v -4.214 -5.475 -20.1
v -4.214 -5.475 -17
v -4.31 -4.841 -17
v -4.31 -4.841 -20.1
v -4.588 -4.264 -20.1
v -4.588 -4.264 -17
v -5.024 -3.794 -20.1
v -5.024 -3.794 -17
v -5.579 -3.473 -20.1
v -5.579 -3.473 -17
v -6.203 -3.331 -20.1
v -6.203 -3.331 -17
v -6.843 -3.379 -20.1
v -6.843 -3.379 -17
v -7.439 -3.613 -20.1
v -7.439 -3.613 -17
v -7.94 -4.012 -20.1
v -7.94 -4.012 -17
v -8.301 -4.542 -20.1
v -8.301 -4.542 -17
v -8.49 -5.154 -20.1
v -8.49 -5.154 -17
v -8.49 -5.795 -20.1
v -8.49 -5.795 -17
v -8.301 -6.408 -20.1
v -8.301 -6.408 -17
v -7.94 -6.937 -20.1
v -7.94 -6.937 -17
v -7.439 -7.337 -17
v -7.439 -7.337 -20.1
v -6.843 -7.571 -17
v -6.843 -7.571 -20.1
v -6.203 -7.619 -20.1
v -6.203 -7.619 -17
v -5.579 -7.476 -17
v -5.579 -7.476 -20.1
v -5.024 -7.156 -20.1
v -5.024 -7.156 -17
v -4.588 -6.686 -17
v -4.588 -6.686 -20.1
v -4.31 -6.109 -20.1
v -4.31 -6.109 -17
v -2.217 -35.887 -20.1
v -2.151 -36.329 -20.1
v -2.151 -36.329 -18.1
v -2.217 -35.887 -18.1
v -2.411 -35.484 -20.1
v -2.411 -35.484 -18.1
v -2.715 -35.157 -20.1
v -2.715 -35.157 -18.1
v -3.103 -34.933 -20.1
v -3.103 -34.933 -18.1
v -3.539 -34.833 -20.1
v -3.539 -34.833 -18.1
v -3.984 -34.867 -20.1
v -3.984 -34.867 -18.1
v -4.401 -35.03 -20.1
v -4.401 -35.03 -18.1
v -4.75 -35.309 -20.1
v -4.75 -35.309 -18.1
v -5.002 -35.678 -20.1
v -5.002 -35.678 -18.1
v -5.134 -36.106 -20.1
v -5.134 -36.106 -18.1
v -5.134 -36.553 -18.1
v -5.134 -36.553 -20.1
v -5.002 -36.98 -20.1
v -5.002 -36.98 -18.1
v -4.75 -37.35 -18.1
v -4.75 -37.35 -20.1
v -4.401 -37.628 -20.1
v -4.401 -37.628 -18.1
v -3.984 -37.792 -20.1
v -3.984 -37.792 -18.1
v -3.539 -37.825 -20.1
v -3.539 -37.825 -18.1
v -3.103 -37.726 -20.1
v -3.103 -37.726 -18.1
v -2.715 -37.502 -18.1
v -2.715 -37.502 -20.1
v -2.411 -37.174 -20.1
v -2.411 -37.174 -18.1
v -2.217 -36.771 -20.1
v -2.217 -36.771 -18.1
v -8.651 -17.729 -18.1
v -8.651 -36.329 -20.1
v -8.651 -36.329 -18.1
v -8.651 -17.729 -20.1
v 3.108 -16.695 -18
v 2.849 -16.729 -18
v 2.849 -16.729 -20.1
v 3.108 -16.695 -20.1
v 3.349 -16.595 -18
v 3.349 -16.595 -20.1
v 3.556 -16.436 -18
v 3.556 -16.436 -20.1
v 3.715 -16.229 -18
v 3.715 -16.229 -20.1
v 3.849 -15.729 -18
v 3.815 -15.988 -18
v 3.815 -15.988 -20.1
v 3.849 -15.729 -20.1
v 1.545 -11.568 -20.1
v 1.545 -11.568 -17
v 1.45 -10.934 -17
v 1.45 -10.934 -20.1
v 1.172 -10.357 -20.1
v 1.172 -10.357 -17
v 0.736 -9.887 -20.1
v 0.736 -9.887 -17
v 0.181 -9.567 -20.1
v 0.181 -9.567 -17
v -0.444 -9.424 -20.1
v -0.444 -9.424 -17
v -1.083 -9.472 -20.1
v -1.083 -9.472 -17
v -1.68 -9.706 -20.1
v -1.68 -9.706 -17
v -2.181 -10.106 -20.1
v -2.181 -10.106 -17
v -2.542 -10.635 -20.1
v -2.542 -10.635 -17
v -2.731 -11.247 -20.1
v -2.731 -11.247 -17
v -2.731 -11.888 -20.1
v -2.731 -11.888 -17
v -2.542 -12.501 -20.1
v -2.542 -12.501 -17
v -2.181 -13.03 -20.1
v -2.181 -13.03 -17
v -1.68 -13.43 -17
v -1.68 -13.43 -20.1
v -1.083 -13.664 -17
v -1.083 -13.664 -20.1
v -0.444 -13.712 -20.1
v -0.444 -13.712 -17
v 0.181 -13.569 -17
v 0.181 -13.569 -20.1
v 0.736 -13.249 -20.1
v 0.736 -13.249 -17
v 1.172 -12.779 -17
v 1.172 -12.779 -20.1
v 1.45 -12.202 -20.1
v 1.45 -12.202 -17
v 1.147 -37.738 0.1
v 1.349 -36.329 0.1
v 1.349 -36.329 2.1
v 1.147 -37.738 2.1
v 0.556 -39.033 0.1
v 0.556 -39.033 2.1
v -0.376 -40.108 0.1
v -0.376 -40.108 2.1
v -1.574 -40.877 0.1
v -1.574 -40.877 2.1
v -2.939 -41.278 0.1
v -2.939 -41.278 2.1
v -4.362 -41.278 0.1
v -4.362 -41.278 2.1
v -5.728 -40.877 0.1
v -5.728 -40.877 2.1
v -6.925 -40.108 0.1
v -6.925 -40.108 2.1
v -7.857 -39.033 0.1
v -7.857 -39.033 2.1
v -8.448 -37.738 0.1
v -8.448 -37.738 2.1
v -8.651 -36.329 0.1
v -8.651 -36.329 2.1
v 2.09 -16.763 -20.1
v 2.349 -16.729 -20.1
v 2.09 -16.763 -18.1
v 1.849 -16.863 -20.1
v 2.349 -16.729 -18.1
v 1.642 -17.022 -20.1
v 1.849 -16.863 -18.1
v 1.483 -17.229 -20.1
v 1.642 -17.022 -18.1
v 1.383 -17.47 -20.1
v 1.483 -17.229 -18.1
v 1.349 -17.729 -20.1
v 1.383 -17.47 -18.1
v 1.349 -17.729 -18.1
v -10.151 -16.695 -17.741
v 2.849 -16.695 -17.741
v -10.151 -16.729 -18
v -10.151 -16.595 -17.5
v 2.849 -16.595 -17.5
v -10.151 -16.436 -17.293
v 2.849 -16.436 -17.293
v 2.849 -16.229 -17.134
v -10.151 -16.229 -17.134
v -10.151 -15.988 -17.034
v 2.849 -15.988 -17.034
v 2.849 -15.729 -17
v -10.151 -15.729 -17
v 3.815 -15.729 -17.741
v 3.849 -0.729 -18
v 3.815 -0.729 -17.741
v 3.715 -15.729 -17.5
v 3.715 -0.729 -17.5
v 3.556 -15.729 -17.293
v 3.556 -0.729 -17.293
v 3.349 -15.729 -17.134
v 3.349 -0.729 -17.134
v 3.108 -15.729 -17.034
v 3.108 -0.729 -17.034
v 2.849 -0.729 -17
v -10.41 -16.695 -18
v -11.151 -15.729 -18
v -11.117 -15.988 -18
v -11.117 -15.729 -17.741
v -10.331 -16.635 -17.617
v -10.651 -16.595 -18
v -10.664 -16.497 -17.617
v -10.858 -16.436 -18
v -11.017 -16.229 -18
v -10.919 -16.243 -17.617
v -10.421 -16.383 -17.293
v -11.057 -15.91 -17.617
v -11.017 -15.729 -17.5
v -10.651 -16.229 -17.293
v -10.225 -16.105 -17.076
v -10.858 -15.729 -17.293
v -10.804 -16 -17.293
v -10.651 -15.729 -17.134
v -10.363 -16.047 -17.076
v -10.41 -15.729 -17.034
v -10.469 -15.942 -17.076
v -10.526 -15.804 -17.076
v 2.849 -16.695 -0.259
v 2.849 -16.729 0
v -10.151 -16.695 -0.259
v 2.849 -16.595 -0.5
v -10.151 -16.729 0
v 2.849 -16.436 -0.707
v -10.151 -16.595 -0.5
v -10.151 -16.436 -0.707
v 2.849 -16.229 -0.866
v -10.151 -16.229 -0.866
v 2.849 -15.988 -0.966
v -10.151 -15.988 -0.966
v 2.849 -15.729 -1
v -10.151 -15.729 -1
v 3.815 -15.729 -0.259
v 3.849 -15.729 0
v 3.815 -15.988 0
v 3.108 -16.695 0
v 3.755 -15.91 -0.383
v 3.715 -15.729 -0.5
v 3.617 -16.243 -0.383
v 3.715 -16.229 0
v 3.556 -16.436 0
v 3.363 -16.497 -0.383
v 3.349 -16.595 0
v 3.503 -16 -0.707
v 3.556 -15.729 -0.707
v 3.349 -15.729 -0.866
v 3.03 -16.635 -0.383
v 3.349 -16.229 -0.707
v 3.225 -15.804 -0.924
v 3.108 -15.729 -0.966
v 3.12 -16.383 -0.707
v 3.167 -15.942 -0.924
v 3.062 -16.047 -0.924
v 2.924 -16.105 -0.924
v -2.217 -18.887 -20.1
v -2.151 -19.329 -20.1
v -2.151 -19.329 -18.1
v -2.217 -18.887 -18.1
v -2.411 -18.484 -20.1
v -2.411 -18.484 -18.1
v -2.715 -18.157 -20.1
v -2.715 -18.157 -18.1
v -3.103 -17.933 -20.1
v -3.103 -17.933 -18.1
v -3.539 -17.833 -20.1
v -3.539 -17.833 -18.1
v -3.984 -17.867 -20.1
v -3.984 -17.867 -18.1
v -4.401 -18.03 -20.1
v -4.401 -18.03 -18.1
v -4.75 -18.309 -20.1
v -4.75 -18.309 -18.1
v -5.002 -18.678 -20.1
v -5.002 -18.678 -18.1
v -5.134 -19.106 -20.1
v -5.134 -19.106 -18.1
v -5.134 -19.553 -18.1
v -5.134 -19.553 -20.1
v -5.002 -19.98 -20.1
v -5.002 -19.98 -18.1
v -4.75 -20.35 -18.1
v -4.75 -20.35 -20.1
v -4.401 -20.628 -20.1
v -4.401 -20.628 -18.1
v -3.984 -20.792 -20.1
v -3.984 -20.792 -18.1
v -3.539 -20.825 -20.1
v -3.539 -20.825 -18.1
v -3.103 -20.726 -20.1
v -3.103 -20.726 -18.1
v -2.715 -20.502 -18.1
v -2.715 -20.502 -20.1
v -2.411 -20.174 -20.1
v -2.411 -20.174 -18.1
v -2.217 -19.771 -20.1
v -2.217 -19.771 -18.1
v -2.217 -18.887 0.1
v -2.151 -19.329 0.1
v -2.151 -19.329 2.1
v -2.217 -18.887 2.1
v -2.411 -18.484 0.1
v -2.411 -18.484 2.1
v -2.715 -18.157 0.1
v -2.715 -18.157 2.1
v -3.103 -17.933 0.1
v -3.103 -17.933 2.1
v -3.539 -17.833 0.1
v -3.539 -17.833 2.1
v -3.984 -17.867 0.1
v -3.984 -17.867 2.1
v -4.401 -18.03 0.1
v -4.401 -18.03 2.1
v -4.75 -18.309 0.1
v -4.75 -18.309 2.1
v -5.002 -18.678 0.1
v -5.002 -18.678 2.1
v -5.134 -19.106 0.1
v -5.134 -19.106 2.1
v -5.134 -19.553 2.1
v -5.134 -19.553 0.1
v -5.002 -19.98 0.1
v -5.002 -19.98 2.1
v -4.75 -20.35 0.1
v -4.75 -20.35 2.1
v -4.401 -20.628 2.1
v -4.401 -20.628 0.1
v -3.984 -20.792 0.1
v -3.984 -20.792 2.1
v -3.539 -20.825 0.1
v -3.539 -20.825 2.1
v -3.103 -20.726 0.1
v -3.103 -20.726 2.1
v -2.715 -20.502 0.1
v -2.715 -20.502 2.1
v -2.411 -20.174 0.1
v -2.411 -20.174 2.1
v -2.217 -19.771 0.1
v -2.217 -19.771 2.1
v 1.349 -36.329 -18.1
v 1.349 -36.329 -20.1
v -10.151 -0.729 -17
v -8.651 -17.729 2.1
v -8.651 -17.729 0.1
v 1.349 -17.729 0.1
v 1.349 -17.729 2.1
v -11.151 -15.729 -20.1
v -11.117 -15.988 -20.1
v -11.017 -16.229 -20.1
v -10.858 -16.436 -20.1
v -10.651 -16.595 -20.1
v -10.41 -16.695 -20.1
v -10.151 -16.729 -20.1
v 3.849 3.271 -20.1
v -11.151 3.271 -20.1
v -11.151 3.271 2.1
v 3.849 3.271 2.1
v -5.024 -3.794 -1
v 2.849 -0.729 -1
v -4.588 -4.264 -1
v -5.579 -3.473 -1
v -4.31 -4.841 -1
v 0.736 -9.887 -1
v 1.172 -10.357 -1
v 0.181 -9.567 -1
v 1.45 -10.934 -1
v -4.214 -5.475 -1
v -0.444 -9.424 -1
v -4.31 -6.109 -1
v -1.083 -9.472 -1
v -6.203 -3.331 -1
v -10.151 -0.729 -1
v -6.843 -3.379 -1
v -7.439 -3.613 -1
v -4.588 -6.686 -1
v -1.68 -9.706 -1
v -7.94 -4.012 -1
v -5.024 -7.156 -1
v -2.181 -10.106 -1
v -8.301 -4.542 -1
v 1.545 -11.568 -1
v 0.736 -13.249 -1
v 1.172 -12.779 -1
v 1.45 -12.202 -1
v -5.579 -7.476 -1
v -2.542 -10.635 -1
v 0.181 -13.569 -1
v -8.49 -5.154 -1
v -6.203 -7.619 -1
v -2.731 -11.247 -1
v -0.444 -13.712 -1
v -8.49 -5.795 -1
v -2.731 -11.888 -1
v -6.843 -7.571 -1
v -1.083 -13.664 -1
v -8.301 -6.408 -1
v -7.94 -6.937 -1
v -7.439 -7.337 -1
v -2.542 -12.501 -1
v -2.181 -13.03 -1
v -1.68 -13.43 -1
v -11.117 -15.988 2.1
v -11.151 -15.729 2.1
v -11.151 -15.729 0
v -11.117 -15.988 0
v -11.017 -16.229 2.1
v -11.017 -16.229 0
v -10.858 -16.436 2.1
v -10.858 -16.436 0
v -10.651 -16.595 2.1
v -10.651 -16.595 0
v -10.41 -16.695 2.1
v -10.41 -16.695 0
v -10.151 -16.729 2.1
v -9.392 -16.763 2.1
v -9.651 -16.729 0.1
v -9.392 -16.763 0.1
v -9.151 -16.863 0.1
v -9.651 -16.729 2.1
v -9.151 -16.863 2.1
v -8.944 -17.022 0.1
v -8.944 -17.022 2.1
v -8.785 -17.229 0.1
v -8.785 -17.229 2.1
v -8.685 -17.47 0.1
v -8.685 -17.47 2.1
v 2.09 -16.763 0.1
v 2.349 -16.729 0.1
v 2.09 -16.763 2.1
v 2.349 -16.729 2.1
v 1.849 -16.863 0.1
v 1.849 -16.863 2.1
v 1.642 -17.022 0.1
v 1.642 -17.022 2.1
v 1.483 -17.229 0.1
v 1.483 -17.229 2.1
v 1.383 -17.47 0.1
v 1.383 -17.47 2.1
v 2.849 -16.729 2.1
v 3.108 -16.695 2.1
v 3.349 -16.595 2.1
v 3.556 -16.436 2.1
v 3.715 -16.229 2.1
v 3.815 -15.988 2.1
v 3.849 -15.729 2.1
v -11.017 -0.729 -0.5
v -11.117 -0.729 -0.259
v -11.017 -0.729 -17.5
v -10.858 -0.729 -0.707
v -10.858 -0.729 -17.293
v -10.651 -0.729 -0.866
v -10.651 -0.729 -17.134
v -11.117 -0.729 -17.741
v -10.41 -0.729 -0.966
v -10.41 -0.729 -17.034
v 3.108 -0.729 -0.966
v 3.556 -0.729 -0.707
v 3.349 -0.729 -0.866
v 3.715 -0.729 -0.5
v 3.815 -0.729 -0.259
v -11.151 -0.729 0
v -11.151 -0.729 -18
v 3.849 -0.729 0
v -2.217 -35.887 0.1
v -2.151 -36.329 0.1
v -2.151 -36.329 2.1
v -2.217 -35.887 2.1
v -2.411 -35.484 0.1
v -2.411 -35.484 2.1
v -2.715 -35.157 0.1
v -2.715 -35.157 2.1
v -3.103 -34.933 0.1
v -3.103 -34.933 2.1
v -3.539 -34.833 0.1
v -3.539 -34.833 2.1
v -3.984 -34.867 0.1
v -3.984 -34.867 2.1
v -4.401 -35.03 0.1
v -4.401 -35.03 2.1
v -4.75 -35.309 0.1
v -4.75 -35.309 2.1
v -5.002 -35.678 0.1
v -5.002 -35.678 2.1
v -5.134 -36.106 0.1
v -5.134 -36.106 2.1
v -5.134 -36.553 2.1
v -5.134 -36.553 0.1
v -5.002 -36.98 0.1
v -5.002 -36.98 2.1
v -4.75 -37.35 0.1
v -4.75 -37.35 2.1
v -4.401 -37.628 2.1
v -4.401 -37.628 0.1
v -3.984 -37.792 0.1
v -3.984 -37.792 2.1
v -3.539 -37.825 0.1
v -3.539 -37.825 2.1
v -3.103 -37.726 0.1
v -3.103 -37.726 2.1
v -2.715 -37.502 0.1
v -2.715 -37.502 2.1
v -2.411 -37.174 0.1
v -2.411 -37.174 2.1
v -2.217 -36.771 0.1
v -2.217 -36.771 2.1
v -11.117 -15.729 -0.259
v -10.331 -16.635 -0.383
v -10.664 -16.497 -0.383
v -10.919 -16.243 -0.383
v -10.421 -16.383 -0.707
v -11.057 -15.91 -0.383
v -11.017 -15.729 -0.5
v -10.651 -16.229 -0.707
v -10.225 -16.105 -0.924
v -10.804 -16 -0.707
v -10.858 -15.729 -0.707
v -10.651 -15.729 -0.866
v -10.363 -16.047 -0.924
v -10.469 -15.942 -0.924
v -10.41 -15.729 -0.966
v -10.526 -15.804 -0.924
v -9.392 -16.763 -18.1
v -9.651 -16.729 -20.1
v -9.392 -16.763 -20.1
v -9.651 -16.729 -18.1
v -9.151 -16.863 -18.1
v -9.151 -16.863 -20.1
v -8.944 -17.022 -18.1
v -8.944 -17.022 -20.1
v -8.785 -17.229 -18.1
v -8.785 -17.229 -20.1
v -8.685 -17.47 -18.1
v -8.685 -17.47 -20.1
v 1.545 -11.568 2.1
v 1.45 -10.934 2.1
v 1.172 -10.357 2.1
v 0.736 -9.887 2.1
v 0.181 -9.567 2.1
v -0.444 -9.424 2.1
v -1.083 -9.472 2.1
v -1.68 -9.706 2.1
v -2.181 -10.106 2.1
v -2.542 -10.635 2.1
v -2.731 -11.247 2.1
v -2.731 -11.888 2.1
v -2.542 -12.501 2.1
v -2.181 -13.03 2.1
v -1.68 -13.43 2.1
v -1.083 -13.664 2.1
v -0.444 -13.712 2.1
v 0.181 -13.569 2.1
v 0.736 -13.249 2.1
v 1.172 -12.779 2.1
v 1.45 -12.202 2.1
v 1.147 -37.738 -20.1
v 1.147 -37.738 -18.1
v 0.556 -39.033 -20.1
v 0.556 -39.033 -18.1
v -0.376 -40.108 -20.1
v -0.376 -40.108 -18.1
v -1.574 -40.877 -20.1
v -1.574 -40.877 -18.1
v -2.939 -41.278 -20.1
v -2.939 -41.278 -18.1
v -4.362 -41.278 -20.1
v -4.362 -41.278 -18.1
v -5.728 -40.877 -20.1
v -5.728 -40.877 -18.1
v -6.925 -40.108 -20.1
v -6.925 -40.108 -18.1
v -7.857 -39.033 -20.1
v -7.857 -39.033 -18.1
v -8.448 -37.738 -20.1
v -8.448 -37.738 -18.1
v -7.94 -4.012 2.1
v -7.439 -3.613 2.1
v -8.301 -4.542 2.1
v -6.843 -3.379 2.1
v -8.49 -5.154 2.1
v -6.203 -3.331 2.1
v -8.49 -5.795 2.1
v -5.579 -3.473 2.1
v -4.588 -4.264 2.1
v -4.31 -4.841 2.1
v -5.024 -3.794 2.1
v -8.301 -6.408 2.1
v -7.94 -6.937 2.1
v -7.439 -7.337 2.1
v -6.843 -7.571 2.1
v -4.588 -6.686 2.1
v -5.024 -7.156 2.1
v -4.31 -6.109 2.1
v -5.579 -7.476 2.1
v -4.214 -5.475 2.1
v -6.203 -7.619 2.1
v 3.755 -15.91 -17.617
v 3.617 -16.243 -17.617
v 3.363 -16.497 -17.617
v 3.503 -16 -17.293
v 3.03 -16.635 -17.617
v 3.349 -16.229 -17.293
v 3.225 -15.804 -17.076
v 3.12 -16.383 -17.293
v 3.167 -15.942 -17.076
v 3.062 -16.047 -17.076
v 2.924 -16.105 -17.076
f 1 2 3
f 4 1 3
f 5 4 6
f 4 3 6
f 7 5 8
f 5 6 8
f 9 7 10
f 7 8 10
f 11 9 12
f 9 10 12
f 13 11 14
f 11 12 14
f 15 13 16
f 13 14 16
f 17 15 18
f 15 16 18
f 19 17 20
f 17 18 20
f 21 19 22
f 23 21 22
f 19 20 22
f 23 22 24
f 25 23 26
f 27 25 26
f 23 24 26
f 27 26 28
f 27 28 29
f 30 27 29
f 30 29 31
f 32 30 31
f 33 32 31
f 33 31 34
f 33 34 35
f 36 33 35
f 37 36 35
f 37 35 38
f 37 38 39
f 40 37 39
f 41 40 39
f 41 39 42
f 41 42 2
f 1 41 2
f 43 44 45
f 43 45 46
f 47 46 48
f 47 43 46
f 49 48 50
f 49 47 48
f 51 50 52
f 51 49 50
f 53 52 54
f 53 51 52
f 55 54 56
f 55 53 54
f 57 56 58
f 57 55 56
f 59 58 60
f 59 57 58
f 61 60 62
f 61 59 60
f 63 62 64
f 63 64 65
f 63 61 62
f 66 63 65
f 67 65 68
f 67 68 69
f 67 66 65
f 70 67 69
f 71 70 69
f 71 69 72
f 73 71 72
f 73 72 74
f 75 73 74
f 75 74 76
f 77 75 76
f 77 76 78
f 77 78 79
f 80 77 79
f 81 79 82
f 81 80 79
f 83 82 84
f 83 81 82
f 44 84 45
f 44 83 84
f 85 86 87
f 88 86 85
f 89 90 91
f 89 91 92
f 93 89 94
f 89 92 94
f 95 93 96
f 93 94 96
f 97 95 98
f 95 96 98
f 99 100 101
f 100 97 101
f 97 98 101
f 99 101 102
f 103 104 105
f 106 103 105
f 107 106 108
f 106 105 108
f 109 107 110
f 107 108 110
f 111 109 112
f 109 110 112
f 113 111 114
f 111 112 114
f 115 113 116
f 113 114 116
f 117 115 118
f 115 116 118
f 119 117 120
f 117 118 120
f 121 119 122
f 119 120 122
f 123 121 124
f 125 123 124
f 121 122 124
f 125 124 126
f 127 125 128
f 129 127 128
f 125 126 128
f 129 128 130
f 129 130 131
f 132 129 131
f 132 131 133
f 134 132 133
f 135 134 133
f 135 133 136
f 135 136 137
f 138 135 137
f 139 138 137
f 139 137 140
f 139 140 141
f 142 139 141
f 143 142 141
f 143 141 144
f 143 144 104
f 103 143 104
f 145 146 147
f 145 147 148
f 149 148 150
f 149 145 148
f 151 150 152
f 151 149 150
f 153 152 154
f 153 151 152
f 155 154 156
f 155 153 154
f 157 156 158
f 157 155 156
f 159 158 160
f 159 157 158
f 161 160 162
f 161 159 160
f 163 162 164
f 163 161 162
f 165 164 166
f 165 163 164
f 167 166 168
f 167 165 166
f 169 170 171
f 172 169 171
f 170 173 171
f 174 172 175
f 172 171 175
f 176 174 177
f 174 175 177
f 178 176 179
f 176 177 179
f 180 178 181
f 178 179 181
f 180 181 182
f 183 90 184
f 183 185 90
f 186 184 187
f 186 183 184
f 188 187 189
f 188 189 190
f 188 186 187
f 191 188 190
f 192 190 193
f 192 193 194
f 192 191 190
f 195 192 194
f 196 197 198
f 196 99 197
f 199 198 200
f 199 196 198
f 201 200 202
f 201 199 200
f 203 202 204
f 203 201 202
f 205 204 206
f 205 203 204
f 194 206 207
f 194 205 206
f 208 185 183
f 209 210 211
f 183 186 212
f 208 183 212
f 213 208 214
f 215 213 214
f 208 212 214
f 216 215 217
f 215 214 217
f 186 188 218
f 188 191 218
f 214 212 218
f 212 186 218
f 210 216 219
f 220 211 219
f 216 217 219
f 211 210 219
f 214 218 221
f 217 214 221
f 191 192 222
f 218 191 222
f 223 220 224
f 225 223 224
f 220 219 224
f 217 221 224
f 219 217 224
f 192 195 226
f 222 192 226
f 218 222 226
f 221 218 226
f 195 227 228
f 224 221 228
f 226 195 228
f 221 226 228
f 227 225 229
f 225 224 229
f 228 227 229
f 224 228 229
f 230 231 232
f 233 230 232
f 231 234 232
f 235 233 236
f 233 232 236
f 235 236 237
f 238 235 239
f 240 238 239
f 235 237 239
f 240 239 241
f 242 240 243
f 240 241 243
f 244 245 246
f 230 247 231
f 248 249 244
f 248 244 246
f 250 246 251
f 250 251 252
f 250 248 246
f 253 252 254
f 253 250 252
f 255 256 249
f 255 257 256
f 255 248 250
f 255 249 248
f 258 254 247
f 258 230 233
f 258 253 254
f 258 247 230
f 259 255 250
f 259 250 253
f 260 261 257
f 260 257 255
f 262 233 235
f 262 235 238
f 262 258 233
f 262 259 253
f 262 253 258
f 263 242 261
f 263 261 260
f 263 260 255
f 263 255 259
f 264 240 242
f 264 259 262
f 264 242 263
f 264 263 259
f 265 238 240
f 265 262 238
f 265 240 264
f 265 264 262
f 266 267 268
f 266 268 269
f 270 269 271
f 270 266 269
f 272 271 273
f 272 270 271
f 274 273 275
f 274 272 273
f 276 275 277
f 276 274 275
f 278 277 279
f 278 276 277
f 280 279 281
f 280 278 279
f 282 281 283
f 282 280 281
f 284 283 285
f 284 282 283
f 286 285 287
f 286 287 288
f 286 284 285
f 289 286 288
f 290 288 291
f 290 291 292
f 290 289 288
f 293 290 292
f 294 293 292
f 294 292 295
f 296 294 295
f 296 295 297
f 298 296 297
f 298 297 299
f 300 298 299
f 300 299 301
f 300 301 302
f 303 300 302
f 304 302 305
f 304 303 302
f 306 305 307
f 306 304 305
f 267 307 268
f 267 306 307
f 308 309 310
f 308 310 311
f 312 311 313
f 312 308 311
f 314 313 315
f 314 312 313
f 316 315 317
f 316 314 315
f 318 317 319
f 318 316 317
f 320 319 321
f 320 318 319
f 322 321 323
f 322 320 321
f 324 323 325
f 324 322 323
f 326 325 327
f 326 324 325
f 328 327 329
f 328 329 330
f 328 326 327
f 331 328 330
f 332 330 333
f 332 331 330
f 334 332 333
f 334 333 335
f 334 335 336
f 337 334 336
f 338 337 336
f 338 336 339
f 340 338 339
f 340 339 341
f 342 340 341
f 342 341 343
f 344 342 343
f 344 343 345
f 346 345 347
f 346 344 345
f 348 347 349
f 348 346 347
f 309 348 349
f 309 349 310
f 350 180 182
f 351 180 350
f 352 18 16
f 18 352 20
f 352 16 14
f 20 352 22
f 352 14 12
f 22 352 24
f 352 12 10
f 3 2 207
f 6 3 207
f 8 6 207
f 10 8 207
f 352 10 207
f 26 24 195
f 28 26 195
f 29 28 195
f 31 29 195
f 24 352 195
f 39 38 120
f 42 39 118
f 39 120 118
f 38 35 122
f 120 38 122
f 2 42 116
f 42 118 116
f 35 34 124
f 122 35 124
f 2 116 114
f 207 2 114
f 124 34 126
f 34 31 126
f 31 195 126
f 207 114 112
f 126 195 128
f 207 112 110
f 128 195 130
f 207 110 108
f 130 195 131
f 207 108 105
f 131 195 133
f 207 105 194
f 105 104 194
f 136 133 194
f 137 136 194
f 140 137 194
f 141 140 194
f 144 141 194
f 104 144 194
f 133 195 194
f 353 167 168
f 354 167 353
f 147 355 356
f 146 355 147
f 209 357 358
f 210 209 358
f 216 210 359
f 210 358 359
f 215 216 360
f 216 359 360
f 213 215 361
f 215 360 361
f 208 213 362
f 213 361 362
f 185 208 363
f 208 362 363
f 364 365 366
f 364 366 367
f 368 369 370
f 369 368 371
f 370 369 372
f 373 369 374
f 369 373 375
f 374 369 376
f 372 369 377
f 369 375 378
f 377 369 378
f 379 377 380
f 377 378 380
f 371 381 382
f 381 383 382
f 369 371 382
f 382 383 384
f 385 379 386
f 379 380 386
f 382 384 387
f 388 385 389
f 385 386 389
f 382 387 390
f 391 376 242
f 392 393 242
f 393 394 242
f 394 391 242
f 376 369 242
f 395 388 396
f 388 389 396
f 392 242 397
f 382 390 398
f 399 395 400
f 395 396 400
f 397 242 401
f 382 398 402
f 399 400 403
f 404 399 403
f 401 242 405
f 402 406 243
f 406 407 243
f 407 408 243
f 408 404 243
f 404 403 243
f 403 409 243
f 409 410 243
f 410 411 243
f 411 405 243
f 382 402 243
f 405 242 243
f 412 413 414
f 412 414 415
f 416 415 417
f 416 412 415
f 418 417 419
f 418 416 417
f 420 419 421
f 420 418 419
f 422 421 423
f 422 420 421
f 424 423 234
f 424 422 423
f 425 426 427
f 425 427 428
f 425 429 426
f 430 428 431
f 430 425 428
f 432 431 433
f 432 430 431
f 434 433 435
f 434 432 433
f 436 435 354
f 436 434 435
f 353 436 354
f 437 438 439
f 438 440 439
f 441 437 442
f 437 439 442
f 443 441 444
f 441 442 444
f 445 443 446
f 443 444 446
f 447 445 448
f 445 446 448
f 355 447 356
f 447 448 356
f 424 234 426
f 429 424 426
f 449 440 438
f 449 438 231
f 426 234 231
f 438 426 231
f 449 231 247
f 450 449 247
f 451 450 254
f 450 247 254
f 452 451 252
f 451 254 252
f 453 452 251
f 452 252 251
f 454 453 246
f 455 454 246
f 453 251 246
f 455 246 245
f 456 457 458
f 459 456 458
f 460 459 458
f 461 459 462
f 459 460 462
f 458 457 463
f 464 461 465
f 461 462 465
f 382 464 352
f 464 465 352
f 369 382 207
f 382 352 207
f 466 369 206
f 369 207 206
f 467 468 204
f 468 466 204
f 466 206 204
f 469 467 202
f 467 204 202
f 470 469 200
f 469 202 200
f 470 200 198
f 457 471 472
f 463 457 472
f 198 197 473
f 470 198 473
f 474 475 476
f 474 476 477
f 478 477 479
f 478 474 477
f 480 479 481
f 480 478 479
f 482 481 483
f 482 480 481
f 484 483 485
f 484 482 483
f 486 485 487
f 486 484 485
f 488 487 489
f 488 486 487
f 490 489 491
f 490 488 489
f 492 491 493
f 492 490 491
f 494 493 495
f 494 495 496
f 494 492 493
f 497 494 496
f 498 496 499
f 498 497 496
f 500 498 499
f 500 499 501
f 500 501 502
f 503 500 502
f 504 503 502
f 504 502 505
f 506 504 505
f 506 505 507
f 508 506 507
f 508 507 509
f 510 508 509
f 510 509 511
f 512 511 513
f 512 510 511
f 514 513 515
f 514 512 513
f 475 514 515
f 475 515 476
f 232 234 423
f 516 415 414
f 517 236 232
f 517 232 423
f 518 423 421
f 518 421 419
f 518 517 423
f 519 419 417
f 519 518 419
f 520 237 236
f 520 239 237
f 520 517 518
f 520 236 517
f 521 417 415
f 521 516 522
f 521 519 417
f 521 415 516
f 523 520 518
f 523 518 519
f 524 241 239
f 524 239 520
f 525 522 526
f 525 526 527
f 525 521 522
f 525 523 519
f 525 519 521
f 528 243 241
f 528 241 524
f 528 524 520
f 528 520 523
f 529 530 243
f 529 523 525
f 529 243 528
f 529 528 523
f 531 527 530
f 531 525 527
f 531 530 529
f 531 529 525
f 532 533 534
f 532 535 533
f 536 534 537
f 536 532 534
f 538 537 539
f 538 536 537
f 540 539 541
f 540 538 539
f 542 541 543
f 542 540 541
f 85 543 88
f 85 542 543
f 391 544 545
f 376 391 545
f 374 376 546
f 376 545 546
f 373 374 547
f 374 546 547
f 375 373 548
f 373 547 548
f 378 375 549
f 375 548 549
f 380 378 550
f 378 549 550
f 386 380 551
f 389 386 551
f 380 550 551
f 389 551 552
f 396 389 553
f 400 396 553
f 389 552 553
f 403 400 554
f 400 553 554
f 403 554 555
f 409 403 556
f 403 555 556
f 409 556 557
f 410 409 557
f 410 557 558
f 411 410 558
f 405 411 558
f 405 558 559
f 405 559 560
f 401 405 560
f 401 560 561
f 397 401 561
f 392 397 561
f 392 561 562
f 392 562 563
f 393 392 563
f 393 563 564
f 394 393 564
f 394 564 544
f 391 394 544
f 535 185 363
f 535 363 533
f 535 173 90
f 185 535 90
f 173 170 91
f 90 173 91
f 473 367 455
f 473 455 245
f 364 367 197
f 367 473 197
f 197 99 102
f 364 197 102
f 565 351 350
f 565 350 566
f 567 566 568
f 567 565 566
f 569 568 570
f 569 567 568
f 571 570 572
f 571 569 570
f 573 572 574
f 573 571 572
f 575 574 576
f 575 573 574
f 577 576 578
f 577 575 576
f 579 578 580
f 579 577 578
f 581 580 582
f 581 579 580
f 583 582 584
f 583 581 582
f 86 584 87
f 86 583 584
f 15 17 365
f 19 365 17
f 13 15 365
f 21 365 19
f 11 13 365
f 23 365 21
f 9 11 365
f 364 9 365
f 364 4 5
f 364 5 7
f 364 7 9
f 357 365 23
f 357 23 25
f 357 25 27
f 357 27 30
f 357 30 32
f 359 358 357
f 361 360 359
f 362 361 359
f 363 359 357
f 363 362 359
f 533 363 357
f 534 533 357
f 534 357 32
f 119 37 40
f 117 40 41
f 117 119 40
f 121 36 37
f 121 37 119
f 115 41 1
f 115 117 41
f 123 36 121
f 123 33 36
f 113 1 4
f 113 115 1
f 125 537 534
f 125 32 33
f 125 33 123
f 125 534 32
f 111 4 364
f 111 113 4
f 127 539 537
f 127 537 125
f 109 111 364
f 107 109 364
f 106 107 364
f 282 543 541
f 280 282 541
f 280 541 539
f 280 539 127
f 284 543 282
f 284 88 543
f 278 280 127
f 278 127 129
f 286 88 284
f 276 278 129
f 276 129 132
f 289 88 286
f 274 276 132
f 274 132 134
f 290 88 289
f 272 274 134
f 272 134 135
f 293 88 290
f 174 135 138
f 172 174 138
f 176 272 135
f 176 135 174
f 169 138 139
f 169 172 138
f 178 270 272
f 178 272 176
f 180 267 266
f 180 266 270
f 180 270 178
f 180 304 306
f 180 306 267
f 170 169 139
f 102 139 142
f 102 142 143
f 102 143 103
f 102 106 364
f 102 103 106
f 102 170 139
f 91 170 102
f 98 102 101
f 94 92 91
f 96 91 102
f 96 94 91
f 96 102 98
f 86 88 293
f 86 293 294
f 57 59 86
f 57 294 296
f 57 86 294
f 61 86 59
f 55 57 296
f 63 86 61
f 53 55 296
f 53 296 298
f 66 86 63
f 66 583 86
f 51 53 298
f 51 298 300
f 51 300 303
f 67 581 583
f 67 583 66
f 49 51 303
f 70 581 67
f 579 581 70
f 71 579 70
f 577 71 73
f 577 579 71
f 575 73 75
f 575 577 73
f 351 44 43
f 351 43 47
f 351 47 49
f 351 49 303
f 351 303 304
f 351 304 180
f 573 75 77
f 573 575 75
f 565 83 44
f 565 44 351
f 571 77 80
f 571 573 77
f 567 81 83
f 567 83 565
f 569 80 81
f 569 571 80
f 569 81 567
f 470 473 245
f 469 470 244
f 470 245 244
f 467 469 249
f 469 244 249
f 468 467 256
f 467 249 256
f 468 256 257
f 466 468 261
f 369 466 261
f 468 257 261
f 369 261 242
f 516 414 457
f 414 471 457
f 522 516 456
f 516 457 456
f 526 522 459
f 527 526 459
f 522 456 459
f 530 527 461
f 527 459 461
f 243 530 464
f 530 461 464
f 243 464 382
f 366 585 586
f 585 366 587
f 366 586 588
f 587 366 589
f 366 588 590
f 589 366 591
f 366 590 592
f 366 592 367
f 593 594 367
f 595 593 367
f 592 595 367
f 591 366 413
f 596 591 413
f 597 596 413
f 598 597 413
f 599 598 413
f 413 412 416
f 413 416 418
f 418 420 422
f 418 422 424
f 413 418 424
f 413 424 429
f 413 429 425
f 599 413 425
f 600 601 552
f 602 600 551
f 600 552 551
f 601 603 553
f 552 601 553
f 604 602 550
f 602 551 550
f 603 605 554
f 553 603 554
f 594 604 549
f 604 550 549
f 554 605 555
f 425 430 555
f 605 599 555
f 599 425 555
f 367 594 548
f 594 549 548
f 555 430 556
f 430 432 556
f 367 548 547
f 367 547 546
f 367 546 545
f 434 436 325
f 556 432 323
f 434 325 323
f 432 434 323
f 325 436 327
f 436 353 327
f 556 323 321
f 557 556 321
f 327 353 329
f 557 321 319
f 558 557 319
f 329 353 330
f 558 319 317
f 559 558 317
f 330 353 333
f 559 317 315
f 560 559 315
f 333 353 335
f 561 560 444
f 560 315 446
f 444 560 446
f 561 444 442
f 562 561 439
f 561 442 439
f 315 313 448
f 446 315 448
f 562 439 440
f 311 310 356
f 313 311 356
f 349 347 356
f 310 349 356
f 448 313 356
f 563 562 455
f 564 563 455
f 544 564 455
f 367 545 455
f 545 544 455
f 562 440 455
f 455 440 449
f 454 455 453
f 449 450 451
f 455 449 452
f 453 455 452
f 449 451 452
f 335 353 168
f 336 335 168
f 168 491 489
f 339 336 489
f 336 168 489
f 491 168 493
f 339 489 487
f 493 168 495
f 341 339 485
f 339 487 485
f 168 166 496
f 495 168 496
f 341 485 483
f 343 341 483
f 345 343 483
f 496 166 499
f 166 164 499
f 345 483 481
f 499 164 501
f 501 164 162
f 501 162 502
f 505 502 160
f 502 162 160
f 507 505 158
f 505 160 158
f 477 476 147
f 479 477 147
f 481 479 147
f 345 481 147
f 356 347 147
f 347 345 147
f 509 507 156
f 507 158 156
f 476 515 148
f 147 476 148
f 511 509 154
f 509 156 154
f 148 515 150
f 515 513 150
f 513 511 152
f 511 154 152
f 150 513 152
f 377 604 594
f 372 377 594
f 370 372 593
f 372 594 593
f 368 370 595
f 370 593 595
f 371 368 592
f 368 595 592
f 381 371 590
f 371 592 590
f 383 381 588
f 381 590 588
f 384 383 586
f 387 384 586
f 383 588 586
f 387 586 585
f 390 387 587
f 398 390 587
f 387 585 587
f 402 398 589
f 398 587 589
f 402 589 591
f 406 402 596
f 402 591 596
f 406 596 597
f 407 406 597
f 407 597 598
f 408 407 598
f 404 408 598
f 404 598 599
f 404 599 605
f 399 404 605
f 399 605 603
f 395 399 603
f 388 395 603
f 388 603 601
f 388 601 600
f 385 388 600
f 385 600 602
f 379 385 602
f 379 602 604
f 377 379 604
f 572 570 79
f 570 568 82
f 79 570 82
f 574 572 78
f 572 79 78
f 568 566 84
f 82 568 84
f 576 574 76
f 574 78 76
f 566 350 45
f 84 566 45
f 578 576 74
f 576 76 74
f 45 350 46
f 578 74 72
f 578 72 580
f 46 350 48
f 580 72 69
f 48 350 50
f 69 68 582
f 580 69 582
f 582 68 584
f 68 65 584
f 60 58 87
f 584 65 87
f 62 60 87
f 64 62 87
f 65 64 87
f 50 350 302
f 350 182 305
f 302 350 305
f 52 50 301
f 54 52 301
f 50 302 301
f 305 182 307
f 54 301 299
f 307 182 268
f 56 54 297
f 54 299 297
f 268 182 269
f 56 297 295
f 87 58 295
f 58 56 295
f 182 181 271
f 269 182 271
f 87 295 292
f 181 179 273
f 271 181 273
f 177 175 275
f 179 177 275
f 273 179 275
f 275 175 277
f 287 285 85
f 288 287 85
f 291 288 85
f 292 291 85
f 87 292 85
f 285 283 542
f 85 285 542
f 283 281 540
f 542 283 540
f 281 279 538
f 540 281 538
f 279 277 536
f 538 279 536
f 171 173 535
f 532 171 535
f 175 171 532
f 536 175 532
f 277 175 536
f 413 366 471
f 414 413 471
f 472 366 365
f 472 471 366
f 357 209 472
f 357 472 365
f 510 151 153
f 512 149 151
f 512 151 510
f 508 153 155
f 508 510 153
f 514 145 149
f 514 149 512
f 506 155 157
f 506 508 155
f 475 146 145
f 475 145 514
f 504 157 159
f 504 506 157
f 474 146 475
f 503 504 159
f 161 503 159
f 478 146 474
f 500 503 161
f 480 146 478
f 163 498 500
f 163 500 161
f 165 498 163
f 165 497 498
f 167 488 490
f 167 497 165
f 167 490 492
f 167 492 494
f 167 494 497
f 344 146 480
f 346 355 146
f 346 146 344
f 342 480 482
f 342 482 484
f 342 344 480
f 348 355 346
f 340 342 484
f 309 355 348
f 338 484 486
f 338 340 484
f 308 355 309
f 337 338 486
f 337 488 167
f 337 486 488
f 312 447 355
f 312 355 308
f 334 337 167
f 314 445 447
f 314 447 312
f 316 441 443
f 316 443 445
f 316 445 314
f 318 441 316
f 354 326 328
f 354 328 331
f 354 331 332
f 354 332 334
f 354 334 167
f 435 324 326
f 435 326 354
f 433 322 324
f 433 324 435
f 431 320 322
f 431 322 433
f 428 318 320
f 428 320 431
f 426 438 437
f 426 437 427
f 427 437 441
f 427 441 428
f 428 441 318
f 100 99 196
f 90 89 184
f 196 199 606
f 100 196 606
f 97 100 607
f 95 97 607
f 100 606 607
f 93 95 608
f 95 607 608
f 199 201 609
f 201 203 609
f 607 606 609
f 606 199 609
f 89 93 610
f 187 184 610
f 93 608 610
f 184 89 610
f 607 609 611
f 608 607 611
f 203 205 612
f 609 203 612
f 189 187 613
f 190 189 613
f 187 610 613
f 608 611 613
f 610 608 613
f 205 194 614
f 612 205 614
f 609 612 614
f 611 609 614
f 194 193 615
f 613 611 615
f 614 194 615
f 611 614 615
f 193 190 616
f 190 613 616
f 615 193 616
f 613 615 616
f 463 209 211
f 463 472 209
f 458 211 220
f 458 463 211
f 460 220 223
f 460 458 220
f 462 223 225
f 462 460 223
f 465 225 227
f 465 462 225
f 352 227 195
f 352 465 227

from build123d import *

# Parameters (mm, degrees)
BOSS_EXTRUDE1_START   = 0.1
SKETCH1_R             = 1.5
BOSS_EXTRUDE1_DEPTH   = 2
SKETCH2_W             = 15
SKETCH2_H             = 3.1
SKETCH2_W_2           = 10
SKETCH2_H_2           = 2
BOSS_EXTRUDE2_DEPTH   = 16
SKETCH3_W             = 15
SKETCH3_H             = 22.2
BOSS_EXTRUDE3_DEPTH   = 4
BOSS_EXTRUDE4_START   = -20.1
SKETCH1_3_R           = 1.5
BOSS_EXTRUDE4_DEPTH   = 2
FILLET1_R             = 1
FILLET2_R             = 1
F_4_0MM_DOWEL_HOLE1_D = 4.3


with BuildPart() as part:
    # Sketch1 → Boss-Extrude1 (new body)
    with BuildSketch(Plane.XY.offset(BOSS_EXTRUDE1_START)):
        with BuildLine():
            Line((-8.650697236, -36.32930415), (-8.650697236, -16.72930415))
            Line((-8.650697236, -16.72930415), (1.349302764, -16.72930415))
            Line((1.349302764, -16.72930415), (1.349302764, -36.32930415))
            ThreePointArc((1.349302764, -36.32930415), (-3.650697236, -41.32930415), (-8.650697236, -36.32930415))
        make_face()
        with Locations((-3.650697236, -19.32930415)):
            Circle(SKETCH1_R, mode=Mode.SUBTRACT)
        with Locations((-3.650697236, -36.32930415)):
            Circle(SKETCH1_R, mode=Mode.SUBTRACT)
    extrude(amount=BOSS_EXTRUDE1_DEPTH)

    # Sketch2 → Boss-Extrude2 (add)
    with BuildSketch(Plane(origin=(0, -16.72930415, 0), x_dir=(1, 0, 0), z_dir=(0, 1, 0))):
        with Locations((-3.650697236, 18.55)):
            Rectangle(SKETCH2_W, SKETCH2_H)
        Polygon((3.849302764, 1), (-11.150697236, 1), (-11.150697236, -2.1), (-8.650697236, -2.1), (-8.650697236, -0.1), (1.349302764, -0.1), (1.349302764, -2.1), (3.849302764, -2.1), align=None)
        with Locations((-3.650697236, -1.1)):
            Rectangle(SKETCH2_W_2, SKETCH2_H_2)
    extrude(amount=BOSS_EXTRUDE2_DEPTH)

    # Sketch3 → Boss-Extrude3 (add)
    with BuildSketch(Plane(origin=(0, -0.72930415, 0), x_dir=(1, 0, 0), z_dir=(0, 1, 0))):
        with Locations((-3.650697236, 9)):
            Rectangle(SKETCH3_W, SKETCH3_H)
    extrude(amount=BOSS_EXTRUDE3_DEPTH)

    # Sketch1<3> → Boss-Extrude4 (add)
    with BuildSketch(Plane.XY.offset(BOSS_EXTRUDE4_START)):
        with BuildLine():
            Line((-8.650697236, -36.32930415), (-8.650697236, -16.72930415))
            Line((-8.650697236, -16.72930415), (1.349302764, -16.72930415))
            Line((1.349302764, -16.72930415), (1.349302764, -36.32930415))
            ThreePointArc((1.349302764, -36.32930415), (-3.650697236, -41.32930415), (-8.650697236, -36.32930415))
        make_face()
        with Locations((-3.650697236, -19.32930415)):
            Circle(SKETCH1_3_R, mode=Mode.SUBTRACT)
        with Locations((-3.650697236, -36.32930415)):
            Circle(SKETCH1_3_R, mode=Mode.SUBTRACT)
    extrude(amount=BOSS_EXTRUDE4_DEPTH)

    # Fillet1
    fillet1_edges = [part.edges().sort_by_distance(p)[0] for p in [
        (3.849302764, -16.72930415, 0.55),
        (-11.150697236, -16.72930415, 0.55),
        (3.849302764, -16.72930415, -18.55),
        (-11.150697236, -16.72930415, -18.55),
        (-8.650697236, -16.72930415, -19.1),
        (1.349302764, -16.72930415, -19.1),
        (-8.650697236, -16.72930415, 1.1),
        (1.349302764, -16.72930415, 1.1),
    ]]
    fillet(fillet1_edges, radius=FILLET1_R)

    # Fillet2
    fillet2_edges = [part.edges().sort_by_distance(p)[0] for p in [
        (-11.150697236, -8.22930415, -1),
        (3.849302764, -8.22930415, -1),
        (-11.150697236, -8.22930415, -17),
        (3.849302764, -8.22930415, -17),
        (-3.650697236, -16.72930415, -17),
        (-10.857804017, -16.436410931, -17),
        (3.556409546, -16.436410931, -17),
        (-3.650697236, -16.72930415, -1),
        (3.556409546, -16.436410931, -1),
        (-10.857804017, -16.436410931, -1),
    ]]
    fillet(fillet2_edges, radius=FILLET2_R)

    # Ø4.0mm Dowel Hole1 (through all)
    with Locations(Plane(origin=(-6.364117909, -5.47483866, -20.1), x_dir=(-1, 0, 0), z_dir=(0, 0, -1))):
        with Locations((0, 0), (-5.759484696, -6.093076476)):
            Hole(F_4_0MM_DOWEL_HOLE1_D / 2)


solid = part.part
